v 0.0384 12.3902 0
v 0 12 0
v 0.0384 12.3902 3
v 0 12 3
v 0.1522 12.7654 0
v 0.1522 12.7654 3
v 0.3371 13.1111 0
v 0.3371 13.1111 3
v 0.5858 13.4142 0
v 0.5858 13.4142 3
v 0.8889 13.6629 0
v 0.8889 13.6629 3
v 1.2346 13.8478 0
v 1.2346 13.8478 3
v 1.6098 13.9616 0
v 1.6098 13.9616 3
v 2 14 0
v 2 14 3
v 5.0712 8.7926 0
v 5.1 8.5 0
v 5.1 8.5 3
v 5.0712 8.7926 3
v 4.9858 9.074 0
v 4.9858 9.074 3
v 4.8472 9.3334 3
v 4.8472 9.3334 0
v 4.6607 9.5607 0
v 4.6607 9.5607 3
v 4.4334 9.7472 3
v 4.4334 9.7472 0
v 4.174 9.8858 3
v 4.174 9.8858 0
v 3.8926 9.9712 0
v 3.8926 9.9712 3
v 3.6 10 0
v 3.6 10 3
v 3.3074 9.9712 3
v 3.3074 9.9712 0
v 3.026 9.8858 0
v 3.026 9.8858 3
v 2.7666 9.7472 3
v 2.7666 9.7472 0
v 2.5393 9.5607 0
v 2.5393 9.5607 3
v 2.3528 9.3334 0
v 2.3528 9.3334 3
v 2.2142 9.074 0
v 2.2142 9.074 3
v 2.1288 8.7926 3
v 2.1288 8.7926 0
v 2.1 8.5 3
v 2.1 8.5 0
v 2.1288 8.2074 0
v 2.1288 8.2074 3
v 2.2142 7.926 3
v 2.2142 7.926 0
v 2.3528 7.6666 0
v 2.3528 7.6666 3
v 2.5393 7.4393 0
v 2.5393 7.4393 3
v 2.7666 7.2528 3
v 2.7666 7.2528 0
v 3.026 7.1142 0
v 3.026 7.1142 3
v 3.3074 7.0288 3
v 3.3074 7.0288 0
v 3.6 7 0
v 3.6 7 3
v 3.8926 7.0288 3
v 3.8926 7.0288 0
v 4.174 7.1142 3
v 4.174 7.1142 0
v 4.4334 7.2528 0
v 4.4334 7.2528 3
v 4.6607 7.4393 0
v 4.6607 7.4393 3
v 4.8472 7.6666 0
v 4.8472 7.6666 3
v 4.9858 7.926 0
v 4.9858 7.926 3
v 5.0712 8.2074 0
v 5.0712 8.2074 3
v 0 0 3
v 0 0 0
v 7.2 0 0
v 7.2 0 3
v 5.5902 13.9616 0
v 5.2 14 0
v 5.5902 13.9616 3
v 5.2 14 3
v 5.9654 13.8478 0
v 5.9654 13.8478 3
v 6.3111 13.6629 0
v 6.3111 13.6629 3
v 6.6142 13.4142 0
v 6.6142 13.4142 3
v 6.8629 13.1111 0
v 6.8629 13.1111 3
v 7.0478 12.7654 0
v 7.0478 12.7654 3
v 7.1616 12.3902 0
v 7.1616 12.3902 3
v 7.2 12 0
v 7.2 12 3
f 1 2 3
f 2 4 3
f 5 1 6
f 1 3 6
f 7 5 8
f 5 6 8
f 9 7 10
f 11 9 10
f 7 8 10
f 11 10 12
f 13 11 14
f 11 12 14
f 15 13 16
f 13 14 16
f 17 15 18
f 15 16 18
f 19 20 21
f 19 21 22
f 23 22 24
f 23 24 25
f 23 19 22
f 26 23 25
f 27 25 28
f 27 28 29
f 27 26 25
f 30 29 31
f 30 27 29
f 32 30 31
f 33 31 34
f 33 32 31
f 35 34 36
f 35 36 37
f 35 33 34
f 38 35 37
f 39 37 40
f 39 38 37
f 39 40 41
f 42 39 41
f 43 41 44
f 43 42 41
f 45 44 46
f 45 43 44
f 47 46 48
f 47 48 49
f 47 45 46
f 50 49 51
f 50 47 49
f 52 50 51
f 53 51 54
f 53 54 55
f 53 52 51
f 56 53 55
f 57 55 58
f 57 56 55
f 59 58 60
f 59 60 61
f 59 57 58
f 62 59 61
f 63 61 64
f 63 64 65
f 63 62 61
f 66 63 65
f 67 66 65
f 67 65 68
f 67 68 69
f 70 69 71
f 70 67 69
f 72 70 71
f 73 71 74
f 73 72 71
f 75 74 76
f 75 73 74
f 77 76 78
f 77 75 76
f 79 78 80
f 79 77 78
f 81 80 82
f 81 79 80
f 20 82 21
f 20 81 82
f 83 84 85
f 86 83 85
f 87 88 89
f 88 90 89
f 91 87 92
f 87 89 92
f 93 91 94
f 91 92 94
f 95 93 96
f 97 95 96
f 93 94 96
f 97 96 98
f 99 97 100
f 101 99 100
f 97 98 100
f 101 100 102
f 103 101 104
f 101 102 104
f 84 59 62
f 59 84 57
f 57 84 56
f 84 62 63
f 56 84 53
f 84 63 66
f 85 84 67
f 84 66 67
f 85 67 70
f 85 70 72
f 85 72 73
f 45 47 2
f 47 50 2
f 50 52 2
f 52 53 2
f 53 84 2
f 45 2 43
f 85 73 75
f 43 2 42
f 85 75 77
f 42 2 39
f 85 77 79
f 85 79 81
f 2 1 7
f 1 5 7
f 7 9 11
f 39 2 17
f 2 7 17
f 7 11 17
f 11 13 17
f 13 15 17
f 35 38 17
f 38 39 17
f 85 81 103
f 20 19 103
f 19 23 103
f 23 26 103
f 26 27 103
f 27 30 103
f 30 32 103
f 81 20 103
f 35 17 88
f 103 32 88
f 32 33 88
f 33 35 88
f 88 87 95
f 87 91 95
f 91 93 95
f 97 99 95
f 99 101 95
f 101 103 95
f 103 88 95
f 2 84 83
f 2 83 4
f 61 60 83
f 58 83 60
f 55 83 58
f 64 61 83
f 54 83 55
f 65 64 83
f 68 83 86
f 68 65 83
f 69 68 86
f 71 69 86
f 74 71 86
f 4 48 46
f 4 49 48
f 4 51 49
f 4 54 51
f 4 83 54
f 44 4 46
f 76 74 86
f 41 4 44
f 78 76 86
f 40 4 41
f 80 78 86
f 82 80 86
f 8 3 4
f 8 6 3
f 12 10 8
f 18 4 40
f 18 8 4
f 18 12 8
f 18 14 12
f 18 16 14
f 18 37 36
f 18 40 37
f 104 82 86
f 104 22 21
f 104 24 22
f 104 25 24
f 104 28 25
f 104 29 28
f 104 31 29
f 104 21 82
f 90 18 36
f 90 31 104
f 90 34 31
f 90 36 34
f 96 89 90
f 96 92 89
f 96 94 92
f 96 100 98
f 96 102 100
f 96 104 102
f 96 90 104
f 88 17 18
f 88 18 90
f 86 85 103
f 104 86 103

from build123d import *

# Parameters (mm, degrees)
ESBO_O1_W                = 7.2
ESBO_O1_H                = 14
ESBO_O1_R                = 1.5
RESSALTO_EXTRUS_O1_DEPTH = 3
FILETE1_R                = 2


with BuildPart() as part:
    # Esboço1 → Ressalto-extrusão1 (new body)
    with BuildSketch(Plane.XY):
        with Locations((3.6, 7)):
            Rectangle(ESBO_O1_W, ESBO_O1_H)
        with Locations((3.6, 8.5)):
            Circle(ESBO_O1_R, mode=Mode.SUBTRACT)
    extrude(amount=RESSALTO_EXTRUS_O1_DEPTH)

    # Filete1
    filete1_edges = [part.edges().sort_by_distance(p)[0] for p in [
        (0, 14, 1.5),
        (7.2, 14, 1.5),
    ]]
    fillet(filete1_edges, radius=FILETE1_R)


solid = part.part
